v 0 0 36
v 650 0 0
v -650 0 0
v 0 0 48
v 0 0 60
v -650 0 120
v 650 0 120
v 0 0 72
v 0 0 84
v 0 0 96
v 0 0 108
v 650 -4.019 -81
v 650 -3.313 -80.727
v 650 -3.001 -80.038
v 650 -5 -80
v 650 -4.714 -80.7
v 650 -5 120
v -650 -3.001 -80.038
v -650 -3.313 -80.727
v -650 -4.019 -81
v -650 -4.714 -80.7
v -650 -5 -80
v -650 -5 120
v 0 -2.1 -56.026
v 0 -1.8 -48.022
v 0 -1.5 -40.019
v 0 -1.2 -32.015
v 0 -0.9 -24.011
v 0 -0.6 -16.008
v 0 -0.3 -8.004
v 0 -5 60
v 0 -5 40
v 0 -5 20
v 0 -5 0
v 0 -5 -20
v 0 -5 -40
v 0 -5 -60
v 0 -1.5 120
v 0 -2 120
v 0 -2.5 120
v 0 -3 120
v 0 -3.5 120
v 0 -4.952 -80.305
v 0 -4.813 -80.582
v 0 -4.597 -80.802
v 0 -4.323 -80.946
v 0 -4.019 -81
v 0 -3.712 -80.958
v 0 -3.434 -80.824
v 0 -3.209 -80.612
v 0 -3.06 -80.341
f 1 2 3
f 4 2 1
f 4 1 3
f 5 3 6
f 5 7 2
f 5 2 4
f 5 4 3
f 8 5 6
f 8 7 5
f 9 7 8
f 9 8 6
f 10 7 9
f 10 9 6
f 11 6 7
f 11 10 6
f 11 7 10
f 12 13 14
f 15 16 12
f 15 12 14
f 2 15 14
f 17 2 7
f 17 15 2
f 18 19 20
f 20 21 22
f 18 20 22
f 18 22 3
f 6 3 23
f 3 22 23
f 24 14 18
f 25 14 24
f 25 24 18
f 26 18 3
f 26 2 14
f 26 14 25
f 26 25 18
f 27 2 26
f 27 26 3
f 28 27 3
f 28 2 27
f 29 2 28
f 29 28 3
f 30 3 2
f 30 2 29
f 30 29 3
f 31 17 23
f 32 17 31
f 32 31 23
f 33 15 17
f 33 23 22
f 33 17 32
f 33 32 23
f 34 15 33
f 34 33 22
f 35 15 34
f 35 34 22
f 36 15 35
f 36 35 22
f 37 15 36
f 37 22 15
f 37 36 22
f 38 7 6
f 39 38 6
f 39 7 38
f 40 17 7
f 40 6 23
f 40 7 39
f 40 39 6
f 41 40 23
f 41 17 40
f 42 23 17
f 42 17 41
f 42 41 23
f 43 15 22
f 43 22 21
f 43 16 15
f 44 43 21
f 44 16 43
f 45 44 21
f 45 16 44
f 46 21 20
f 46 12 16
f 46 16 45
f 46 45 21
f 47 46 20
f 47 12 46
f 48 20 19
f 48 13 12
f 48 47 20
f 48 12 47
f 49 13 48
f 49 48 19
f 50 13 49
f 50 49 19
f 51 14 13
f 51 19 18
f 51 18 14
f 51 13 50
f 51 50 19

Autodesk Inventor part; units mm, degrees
ref_plane "XZ Plane" through (0, 0, 0) normal (0, 1, 0) x (-1, 0, 0)
sketch "スケッチ1" plane through (0, 0, 0) normal (1, 0, 0) x (0, 1, 0)
  line L0 (0, 120) -> (0, 0)
  line L1 (0, 0) -> (-3.0007, -80.0375)
  line L2 (-5, -80) -> (-5, 120)
  line L3 (-5, 120) -> (0, 120)
  arc A0 (-5, -80) -> (-3.0007, -80.0375) centre (-4, -80) ccw
  dimension "d0" = 120
  dimension "d1" = 1
  dimension "d2" = 5
  dimension "d3" = 80
ref_plane "作業平面1" through (650, 0, 0) normal (1, 0, 0) x (0, 1, 0)
sketch "スケッチ2" plane through (650, 0, 0) normal (1, 0, 0) x (0, 1, 0)
  line L0 (0, 120) -> (0, 0)
  line L1 (0, 0) -> (-3.0007, -80.0375)
  line L2 (-5, -80) -> (-5, 120)
  line L3 (-5, 120) -> (0, 120)
  arc A0 (-5, -80) -> (-3.0007, -80.0375) centre (-4, -80) ccw
  dimension "d5" = 120
  dimension "d6" = 1
  dimension "d7" = 5
  dimension "d8" = 80
ref_plane "作業平面2" through (-650, 0, 0) normal (1, 0, 0) x (0, 1, 0)
sketch "スケッチ3" plane through (-650, 0, 0) normal (1, 0, 0) x (0, 1, 0)
  line L0 (0, 120) -> (0, 0)
  line L1 (0, 0) -> (-3.0007, -80.0375)
  line L2 (-5, -80) -> (-5, 120)
  line L3 (-5, 120) -> (0, 120)
  arc A0 (-5, -80) -> (-3.0007, -80.0375) centre (-4, -80) ccw
  dimension "d10" = 120
  dimension "d11" = 1
  dimension "d12" = 5
  dimension "d13" = 80
loft "ロフト1" add profiles "スケッチ3", "スケッチ1", "スケッチ2"
properties part number "test_base"
